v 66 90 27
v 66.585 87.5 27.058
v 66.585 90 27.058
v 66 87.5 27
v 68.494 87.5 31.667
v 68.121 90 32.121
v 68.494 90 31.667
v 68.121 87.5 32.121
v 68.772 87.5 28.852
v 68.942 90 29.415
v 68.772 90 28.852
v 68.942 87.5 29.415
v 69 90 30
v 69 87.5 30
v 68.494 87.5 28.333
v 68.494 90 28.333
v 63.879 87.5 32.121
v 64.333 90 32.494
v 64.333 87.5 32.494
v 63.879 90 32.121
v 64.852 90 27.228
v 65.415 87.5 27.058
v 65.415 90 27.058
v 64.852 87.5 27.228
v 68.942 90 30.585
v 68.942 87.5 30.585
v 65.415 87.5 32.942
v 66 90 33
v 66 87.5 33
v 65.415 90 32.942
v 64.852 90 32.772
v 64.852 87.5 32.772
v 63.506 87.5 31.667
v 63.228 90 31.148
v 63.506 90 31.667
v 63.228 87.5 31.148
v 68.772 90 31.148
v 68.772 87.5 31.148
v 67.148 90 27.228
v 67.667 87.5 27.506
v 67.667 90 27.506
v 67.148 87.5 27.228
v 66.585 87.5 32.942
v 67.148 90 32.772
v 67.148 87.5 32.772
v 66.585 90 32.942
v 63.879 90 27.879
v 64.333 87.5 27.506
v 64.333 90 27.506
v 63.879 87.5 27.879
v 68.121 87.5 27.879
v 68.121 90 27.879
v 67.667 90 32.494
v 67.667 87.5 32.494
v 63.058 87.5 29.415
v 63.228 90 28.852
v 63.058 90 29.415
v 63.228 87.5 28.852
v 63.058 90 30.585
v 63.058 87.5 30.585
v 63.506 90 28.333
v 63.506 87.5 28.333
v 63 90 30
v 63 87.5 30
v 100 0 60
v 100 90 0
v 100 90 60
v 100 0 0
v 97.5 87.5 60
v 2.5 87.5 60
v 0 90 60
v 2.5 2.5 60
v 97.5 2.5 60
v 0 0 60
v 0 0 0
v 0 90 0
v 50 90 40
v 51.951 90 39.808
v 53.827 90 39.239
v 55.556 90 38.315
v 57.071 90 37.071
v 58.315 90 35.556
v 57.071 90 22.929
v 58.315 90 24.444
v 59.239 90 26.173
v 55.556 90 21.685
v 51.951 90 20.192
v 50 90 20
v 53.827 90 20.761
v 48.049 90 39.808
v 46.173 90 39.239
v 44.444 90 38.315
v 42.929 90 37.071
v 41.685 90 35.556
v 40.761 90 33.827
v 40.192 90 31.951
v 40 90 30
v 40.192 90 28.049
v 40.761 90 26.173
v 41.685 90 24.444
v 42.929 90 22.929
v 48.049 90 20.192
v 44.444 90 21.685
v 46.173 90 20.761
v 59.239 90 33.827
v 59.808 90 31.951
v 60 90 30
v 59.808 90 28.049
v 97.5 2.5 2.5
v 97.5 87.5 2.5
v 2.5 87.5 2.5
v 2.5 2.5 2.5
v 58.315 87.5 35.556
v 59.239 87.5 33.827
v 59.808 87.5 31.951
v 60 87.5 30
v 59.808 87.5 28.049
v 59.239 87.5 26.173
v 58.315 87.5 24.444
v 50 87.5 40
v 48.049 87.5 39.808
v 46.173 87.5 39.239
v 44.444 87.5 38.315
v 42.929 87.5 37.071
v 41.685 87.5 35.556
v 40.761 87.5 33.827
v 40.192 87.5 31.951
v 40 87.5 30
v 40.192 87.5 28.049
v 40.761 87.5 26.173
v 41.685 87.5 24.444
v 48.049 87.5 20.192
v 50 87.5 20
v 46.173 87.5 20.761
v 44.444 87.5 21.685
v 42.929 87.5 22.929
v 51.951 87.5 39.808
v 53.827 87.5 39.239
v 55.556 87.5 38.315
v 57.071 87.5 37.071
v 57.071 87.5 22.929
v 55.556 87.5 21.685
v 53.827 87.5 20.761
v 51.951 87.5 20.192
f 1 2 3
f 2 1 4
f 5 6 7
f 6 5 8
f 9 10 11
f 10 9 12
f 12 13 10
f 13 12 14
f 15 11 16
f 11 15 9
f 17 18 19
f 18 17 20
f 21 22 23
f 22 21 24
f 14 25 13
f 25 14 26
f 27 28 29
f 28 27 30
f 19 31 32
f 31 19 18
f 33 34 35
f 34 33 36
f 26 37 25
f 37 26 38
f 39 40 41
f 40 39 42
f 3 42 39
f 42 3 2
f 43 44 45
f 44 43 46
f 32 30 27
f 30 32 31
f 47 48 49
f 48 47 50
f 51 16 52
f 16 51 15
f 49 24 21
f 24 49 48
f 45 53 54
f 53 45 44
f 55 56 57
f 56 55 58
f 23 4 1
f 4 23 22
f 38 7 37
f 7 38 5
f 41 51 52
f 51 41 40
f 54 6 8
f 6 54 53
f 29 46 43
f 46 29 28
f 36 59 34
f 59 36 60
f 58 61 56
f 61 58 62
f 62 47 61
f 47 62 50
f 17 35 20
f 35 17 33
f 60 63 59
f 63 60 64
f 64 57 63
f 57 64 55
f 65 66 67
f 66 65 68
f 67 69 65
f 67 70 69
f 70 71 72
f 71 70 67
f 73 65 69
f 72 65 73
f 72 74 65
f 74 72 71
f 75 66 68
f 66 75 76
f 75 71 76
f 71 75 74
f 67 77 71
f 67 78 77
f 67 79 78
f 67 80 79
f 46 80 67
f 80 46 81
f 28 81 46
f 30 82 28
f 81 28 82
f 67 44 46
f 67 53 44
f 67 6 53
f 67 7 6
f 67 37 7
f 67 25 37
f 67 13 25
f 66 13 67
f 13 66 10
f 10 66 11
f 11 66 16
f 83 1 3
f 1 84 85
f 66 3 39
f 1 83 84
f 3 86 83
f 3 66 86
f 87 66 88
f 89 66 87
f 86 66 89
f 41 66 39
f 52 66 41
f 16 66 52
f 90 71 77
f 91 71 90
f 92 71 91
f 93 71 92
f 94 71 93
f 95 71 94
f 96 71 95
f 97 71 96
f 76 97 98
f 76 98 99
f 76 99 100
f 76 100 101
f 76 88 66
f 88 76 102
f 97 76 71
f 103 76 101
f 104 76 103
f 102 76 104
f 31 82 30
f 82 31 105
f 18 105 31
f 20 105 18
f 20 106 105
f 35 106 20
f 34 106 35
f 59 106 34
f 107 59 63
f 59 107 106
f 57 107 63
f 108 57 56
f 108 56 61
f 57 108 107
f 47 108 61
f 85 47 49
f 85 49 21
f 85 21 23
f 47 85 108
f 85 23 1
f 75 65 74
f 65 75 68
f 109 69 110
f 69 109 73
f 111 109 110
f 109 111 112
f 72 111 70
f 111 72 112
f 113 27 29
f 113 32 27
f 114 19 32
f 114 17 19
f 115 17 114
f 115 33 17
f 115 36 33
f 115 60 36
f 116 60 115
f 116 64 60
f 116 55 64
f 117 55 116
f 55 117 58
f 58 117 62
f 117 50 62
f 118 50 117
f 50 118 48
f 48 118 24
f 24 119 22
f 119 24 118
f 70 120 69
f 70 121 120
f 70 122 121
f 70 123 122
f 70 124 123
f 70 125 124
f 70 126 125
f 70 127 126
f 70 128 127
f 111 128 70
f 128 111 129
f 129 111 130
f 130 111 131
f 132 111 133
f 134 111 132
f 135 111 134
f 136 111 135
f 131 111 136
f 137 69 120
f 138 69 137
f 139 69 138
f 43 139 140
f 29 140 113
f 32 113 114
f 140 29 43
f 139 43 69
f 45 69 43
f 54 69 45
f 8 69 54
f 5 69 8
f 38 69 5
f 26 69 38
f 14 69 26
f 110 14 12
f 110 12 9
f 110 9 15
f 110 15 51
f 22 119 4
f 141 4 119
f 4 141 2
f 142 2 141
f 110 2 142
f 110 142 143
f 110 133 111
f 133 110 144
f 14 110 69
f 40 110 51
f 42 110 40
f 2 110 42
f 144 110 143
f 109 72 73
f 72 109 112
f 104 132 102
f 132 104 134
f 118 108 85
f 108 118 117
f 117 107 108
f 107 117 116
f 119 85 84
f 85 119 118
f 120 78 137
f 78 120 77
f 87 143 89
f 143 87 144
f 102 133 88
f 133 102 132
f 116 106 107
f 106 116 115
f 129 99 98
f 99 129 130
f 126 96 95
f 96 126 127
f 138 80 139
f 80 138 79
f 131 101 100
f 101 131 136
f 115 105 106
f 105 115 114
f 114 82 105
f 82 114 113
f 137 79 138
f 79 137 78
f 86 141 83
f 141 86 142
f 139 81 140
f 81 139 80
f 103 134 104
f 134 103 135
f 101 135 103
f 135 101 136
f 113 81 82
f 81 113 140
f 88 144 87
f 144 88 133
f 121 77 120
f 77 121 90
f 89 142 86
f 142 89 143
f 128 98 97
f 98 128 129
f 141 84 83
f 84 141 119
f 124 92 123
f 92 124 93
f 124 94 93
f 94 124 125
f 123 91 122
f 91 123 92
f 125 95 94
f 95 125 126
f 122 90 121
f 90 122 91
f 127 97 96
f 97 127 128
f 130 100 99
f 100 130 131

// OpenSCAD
$fn = 32;

// ----------------------------------------------------------------------
// Vent box: roundvent enclosure
// ----------------------------------------------------------------------

// --- parameters (mm) ---
box_l = 100;              // box length, X
box_w = 90;               // box width, Y
box_h = 60;               // box height, Z
wall_t = 2.5;             // shell wall thickness
vent_d = 20;              // central vent diameter
ring_d = 6;               // ring hole diameter
n_ring = 6;               // holes in the ring
ring_r = 16;              // ring radius

ring_step = 360 / n_ring;  // ring hole angular step

difference() {
  cube([box_l, box_w, box_h]);
  translate([wall_t, wall_t, wall_t])
    cube([box_l - 2 * wall_t, box_w - 2 * wall_t, box_h]);
  translate([box_l / 2, box_w - wall_t - 1, box_h / 2])
    rotate([-90, 0, 0]) cylinder(h = wall_t + 2, d = vent_d);
  for (i = [0 : n_ring - 1])
    translate([box_l / 2, box_w - wall_t - 1, box_h / 2])
      rotate([0, 0, i * ring_step])
        translate([ring_r, 0, 0]) rotate([-90, 0, 0])
          cylinder(h = wall_t + 2, d = ring_d);
}
